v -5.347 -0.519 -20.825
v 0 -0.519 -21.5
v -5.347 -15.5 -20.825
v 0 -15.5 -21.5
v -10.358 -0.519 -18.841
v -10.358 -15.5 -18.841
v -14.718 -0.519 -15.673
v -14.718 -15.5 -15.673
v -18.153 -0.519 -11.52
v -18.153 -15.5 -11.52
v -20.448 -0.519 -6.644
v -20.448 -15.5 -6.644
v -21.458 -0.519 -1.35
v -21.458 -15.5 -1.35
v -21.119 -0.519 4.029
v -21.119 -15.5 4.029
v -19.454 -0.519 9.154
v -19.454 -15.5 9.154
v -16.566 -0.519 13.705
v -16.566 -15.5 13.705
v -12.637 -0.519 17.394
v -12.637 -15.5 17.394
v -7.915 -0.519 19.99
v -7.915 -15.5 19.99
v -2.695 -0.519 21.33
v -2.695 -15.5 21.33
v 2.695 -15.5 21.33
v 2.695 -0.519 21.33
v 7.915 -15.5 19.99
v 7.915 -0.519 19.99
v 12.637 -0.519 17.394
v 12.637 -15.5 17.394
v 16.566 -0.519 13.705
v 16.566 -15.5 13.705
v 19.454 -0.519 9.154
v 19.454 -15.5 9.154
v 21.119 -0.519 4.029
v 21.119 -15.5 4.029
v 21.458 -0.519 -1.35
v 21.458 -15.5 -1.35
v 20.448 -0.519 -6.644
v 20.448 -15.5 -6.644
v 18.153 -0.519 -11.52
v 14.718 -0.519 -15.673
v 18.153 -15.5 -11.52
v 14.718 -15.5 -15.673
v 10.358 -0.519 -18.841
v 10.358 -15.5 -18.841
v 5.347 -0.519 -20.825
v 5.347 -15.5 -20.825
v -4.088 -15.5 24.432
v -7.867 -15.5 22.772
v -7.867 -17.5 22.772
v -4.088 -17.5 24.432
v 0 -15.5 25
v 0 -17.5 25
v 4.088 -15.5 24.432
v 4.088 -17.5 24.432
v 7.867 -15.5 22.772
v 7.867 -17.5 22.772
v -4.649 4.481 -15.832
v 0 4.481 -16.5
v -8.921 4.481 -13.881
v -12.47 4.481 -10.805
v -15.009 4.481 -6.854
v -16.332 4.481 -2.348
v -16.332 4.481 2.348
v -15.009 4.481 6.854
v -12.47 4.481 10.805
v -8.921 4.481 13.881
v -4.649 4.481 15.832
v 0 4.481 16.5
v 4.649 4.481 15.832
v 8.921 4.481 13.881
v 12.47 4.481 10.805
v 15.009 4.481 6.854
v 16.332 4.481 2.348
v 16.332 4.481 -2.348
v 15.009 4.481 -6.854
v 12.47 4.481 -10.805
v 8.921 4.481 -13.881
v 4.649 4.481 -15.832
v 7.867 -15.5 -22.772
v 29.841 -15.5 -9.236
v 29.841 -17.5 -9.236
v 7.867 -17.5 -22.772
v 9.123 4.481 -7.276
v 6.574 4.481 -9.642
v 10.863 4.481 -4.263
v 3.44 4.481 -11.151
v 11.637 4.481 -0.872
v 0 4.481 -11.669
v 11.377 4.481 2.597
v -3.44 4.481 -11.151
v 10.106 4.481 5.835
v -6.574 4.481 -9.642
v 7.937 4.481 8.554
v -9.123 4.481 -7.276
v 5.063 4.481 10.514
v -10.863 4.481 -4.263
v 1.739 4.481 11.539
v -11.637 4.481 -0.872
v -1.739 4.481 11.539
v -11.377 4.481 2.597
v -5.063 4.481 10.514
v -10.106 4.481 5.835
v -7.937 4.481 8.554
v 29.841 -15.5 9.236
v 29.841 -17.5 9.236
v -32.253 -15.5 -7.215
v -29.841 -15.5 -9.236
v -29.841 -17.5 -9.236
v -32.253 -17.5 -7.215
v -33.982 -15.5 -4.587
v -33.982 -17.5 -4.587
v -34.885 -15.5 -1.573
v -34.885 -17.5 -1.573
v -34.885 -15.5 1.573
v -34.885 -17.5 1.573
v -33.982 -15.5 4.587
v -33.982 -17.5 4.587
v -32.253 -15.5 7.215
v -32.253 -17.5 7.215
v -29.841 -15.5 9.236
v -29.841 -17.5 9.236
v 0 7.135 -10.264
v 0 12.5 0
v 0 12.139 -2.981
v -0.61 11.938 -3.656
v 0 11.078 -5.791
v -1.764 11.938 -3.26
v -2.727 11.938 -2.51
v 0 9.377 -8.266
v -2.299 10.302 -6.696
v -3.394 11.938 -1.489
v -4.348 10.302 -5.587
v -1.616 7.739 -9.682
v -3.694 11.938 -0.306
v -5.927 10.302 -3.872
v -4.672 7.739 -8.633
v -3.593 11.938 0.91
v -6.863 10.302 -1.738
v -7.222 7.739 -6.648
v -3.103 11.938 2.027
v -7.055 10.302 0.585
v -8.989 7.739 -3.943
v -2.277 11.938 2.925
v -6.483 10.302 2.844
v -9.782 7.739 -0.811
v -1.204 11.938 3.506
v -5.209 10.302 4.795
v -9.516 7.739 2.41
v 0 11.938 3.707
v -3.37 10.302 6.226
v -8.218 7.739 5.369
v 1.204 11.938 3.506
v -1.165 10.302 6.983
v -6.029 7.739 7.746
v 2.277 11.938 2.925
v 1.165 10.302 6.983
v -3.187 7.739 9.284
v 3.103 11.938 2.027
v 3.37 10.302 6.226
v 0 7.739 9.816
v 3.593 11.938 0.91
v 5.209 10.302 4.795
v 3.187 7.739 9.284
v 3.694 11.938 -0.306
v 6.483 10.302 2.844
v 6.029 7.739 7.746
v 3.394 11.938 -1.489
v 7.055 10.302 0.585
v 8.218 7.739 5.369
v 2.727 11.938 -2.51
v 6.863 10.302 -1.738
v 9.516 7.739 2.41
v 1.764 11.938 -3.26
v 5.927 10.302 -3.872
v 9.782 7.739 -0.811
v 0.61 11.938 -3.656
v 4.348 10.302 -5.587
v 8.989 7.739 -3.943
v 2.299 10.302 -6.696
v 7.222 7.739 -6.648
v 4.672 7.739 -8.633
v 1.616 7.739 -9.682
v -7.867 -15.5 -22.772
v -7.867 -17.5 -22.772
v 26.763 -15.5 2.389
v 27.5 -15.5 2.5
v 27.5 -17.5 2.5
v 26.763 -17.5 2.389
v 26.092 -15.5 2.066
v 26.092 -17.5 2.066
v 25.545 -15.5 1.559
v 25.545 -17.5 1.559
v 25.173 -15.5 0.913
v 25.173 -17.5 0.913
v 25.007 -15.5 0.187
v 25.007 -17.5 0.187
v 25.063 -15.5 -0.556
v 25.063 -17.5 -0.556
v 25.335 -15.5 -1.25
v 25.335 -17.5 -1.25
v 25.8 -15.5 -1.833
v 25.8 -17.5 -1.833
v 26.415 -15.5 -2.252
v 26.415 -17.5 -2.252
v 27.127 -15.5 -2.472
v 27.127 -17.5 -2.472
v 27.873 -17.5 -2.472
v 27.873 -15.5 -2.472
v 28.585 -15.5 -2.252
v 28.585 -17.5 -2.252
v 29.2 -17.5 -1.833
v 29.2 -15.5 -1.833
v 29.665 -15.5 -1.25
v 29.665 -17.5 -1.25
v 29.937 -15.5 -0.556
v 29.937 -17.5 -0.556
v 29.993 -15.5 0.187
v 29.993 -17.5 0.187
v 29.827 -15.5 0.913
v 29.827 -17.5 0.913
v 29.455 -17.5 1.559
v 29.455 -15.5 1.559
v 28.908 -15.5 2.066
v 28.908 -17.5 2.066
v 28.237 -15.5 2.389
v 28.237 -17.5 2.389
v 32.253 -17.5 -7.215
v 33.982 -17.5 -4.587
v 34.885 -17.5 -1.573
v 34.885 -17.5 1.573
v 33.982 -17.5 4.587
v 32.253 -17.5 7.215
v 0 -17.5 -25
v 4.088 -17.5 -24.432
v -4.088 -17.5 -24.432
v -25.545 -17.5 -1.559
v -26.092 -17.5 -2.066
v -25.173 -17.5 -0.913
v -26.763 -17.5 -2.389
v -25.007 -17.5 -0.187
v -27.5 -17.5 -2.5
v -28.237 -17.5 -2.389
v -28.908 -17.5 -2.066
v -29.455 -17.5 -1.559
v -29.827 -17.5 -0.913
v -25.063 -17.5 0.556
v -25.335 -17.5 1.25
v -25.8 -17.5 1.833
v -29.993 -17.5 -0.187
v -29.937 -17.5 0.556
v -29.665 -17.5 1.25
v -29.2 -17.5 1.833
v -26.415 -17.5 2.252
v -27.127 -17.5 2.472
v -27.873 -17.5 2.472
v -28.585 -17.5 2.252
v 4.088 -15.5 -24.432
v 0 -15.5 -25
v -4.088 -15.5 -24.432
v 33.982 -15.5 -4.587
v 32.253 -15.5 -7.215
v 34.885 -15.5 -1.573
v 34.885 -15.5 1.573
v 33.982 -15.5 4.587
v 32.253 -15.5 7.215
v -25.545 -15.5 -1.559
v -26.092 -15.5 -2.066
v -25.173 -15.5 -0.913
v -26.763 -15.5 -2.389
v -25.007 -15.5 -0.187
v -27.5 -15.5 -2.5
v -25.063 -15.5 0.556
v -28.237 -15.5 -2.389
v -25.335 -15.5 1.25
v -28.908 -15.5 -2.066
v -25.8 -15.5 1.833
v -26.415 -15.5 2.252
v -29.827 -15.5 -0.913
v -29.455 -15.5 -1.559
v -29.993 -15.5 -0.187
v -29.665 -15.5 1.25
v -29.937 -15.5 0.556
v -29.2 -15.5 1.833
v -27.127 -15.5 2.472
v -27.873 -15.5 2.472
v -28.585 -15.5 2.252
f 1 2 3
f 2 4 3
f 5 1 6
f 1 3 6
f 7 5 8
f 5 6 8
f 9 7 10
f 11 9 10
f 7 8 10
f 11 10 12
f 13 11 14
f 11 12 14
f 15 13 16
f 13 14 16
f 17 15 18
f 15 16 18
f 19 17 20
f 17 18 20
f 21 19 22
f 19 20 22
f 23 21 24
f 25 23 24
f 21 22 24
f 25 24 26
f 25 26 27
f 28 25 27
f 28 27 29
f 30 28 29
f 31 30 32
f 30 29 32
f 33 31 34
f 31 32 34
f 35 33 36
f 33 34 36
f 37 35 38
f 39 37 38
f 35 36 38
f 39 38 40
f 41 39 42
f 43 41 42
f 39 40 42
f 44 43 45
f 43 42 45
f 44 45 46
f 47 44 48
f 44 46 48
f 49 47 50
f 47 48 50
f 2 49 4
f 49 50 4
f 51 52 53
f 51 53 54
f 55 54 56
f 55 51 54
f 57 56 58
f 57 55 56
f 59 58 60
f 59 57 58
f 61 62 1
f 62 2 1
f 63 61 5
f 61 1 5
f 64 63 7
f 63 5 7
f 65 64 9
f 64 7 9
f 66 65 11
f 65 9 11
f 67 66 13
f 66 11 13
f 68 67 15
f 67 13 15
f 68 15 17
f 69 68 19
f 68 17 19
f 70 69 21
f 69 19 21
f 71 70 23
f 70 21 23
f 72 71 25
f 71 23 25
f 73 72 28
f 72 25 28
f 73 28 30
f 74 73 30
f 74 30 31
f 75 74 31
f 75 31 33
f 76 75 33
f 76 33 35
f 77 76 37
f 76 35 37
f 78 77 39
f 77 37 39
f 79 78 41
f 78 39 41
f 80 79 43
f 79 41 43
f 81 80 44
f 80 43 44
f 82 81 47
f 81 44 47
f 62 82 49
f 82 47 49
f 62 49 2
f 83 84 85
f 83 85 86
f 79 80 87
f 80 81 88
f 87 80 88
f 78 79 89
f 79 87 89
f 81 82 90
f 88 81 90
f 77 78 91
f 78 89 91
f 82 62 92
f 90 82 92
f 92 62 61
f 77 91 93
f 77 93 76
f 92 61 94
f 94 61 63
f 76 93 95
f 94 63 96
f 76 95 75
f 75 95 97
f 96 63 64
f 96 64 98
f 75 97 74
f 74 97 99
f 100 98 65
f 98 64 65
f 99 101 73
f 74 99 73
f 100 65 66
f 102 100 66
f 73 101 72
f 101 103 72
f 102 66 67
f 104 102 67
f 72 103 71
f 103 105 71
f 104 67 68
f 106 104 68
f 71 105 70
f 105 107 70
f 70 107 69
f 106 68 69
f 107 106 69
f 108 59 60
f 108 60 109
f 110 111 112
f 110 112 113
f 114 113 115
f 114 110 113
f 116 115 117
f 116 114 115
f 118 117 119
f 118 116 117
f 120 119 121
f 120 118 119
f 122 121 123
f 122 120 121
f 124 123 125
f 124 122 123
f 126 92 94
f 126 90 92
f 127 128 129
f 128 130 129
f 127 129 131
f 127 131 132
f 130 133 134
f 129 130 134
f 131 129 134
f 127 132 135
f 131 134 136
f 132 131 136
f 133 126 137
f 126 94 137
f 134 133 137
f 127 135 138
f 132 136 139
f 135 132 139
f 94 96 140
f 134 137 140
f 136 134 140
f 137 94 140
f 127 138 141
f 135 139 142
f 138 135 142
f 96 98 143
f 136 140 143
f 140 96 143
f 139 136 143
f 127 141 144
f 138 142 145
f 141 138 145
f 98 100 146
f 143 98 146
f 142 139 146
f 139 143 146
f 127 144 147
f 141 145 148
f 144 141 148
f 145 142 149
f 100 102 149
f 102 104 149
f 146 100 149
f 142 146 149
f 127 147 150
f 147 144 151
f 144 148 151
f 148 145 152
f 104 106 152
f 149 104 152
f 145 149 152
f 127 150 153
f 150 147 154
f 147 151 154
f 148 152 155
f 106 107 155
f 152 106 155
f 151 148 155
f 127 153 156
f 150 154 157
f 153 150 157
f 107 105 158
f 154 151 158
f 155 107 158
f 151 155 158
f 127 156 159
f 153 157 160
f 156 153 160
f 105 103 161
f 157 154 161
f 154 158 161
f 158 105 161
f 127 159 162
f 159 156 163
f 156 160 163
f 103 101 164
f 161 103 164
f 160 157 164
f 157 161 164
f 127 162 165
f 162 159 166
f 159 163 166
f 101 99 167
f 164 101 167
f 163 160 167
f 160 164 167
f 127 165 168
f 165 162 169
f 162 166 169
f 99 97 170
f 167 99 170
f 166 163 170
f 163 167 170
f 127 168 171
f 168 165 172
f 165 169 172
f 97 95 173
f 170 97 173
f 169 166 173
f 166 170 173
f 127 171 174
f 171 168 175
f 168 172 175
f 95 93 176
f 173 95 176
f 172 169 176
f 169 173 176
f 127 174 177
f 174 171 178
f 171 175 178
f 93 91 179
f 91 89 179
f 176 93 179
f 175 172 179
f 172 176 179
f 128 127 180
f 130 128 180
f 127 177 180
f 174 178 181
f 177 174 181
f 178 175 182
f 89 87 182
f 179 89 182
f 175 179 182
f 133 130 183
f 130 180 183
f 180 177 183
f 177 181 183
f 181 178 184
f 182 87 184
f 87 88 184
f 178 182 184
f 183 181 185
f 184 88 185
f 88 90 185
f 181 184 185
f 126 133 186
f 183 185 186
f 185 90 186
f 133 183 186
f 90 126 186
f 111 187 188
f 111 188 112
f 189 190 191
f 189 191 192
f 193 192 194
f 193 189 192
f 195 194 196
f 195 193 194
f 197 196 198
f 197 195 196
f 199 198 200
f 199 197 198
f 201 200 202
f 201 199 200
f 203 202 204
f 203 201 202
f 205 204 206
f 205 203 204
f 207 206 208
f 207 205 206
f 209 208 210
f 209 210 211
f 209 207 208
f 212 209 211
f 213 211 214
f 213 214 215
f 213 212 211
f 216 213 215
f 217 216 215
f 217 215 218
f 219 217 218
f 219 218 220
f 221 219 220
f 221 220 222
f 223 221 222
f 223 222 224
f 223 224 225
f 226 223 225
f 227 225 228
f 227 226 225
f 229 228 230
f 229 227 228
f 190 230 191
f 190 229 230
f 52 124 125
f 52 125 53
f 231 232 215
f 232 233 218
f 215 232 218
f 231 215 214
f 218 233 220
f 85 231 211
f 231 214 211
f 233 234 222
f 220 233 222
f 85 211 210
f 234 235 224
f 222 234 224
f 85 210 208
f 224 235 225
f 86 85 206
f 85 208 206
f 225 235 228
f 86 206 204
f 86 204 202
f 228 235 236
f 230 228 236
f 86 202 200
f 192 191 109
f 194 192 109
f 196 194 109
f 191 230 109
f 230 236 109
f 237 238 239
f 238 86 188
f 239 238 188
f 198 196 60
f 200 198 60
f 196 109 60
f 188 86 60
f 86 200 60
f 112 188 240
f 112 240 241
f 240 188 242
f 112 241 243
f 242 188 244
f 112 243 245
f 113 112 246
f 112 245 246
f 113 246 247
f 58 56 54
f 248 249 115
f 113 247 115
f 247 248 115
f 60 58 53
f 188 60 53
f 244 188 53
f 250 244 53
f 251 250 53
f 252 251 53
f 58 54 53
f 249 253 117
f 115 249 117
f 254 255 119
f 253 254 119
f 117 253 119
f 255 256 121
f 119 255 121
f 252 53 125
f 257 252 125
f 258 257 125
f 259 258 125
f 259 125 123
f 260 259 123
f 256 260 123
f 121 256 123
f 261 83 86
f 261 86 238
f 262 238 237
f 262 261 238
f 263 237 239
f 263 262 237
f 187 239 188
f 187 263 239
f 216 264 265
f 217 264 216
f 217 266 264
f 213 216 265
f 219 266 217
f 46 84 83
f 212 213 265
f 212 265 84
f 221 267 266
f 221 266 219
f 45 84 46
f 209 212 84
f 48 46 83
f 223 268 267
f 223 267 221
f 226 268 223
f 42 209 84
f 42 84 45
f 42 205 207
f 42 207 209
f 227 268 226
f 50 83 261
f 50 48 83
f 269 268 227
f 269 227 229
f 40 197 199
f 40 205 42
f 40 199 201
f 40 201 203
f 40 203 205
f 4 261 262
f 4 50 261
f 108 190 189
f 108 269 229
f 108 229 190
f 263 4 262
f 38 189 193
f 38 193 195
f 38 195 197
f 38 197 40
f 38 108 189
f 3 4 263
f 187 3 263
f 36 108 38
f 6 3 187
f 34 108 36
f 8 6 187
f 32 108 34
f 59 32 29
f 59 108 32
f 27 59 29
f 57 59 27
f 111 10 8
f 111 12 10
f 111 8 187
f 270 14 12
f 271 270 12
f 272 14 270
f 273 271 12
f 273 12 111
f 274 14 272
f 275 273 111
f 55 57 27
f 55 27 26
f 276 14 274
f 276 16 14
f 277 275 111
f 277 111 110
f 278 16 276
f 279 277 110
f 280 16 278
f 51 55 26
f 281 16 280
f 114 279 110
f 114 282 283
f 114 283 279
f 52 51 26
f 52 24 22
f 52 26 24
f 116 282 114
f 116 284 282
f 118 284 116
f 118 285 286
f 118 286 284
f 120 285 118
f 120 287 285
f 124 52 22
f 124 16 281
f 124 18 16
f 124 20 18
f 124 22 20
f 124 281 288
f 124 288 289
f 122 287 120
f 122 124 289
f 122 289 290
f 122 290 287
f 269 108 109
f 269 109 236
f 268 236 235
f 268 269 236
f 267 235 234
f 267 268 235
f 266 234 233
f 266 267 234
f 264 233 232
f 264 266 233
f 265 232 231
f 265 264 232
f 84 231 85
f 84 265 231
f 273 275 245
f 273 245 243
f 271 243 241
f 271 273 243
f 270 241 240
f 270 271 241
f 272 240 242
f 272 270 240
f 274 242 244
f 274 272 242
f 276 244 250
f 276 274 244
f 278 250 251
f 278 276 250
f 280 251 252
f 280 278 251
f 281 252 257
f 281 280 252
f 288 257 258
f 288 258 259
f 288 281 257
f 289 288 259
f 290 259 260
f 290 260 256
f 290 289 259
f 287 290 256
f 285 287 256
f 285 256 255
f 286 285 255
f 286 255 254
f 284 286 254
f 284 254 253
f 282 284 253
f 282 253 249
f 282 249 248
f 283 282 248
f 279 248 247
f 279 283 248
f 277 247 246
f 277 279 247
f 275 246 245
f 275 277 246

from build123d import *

# Parameters (mm, degrees)
SKETCH_2_R      = 2.5
EXTRUDE_1_DEPTH = 2


with BuildPart() as part:
    # 草图1 → 旋转2 (revolve)
    with BuildSketch(Plane.XY, mode=Mode.PRIVATE) as revolve_2_sk:
        with BuildLine():
            ThreePointArc((0, 12.5), (-7.079662177, 10.301863107), (-11.669393693, 4.480541354))
            Line((-11.669393693, 4.480541354), (-16.5, 4.480541354))
            Line((-16.5, 4.480541354), (-21.5, -0.519458646))
            Line((-21.5, -0.519458646), (-21.5, -15.5))
            Line((-21.5, -15.5), (0, -15.5))
            Line((0, -15.5), (0, 12.5))
        make_face()
    revolve(revolve_2_sk.sketch.rotate(Axis((0, 0, 0), (0, 1, 0)), 270), axis=Axis((0, 0, 0), (0, 1, 0)))

    # 草图2 → 凸台-拉伸1 (add)
    with BuildSketch(Plane.XZ.offset(15.5)):
        with BuildLine():
            Line((-29.841345501, 9.236236767), (-7.866752906, 22.771616919))
            ThreePointArc((-7.866752906, 22.771616919), (0, 25), (7.866752906, 22.771616919))
            Line((7.866752906, 22.771616919), (29.841345501, 9.236236767))
            ThreePointArc((29.841345501, 9.236236767), (35, 0), (29.841345501, -9.236236767))
            Line((29.841345501, -9.236236767), (7.866752906, -22.771616919))
            ThreePointArc((7.866752906, -22.771616919), (0, -25), (-7.866752906, -22.771616919))
            Line((-7.866752906, -22.771616919), (-29.841345501, -9.236236767))
            ThreePointArc((-29.841345501, -9.236236767), (-35, 0), (-29.841345501, 9.236236767))
        make_face()
        with Locations(Location((-27.5, 0, 0), (0, 0, 270))):
            Circle(SKETCH_2_R, mode=Mode.SUBTRACT)
        with Locations(Location((27.5, 0, 0), (0, 0, 90))):
            Circle(SKETCH_2_R, mode=Mode.SUBTRACT)
    extrude(amount=EXTRUDE_1_DEPTH)


solid = part.part
